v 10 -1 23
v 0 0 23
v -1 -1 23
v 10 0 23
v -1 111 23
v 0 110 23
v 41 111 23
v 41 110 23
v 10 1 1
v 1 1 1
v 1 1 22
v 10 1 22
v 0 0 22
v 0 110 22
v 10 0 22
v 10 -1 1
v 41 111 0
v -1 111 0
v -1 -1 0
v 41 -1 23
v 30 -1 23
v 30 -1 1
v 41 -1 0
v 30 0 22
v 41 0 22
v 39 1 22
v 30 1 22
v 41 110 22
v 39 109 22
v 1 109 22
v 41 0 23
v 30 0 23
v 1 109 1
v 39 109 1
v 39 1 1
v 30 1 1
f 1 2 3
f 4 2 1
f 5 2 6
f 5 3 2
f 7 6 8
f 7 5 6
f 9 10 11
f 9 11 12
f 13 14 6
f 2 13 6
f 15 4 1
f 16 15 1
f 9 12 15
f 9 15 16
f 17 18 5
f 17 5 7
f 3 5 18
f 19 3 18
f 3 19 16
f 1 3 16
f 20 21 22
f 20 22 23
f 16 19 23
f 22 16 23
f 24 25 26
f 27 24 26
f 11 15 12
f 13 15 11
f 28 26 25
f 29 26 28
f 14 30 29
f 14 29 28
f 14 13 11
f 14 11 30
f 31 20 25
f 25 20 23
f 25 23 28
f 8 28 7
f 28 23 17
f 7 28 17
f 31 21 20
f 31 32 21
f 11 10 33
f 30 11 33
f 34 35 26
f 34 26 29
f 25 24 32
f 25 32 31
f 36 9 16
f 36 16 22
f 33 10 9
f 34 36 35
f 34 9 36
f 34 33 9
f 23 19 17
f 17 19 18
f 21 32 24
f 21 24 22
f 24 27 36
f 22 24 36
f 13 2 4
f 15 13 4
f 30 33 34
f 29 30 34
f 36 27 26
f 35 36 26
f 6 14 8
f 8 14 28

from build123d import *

# Parameters (mm, degrees)
SKETCH_1_W          = 40
SKETCH_1_H          = 110
EXTRUDE_1_DEPTH     = 22
SHELL_1_T           = -1
SKETCH_17_W         = 20
SKETCH_17_H         = 21
CUT_EXTRUDE_3_DEPTH = 2
SKETCH_2_W          = 23
SKETCH_2_H          = 110
EXTRUDE_2_DEPTH     = 1
SKETCH_3_W          = 41
SKETCH_3_H          = 23
EXTRUDE_3_DEPTH     = 1
SKETCH_18_W         = 20
SKETCH_18_H         = 22
CUT_EXTRUDE_4_DEPTH = 2
SKETCH_5_W          = 41
SKETCH_5_H          = 23
EXTRUDE_4_DEPTH     = 1
SKETCH_9_W          = 22
SKETCH_9_H          = 112
EXTRUDE_5_DEPTH     = 1
SKETCH_10_W         = 1
SKETCH_10_H         = 1
EXTRUDE_6_DEPTH     = 1
SKETCH_11_W         = 1
SKETCH_11_H         = 1
EXTRUDE_7_DEPTH     = 1


with BuildPart() as part:
    # 스케치1 → 보스-돌출1 (new body)
    with BuildSketch(Plane.XY):
        with Locations((20, 55)):
            Rectangle(SKETCH_1_W, SKETCH_1_H)
    extrude(amount=EXTRUDE_1_DEPTH)

    # 쉘1
    shell_1_openings = [part.faces().sort_by_distance(p)[0] for p in [
        (20, 55, 22),
    ]]
    offset(amount=SHELL_1_T, openings=shell_1_openings, kind=Kind.INTERSECTION)

    # 스케치17 → 컷-돌출3 (cut, through all)
    with BuildSketch(Plane(origin=(0, 1, 0), x_dir=(1, 0, 0), z_dir=(0, 1, 0))):
        with Locations((20, -11.5)):
            Rectangle(SKETCH_17_W, SKETCH_17_H)
    extrude(amount=-CUT_EXTRUDE_3_DEPTH, mode=Mode.SUBTRACT)

    # 스케치2 → 보스-돌출2 (add)
    with BuildSketch(Plane.ZY):
        with Locations((11.5, 55)):
            Rectangle(SKETCH_2_W, SKETCH_2_H)
    extrude(amount=EXTRUDE_2_DEPTH)

    # 스케치3 → 보스-돌출3 (add)
    with BuildSketch(Plane.XZ):
        with Locations((19.5, 11.5)):
            Rectangle(SKETCH_3_W, SKETCH_3_H)
    extrude(amount=EXTRUDE_3_DEPTH)

    # 스케치18 → 컷-돌출4 (cut, through all)
    with BuildSketch(Plane(origin=(0, 0, 0), x_dir=(1, 0, 0), z_dir=(0, 1, 0))):
        with Locations((20, -12)):
            Rectangle(SKETCH_18_W, SKETCH_18_H)
    extrude(amount=-CUT_EXTRUDE_4_DEPTH, mode=Mode.SUBTRACT)

    # 스케치5 → 보스-돌출4 (add)
    with BuildSketch(Plane(origin=(0, 110, 0), x_dir=(1, 0, 0), z_dir=(0, 1, 0))):
        with Locations((19.5, -11.5)):
            Rectangle(SKETCH_5_W, SKETCH_5_H)
    extrude(amount=EXTRUDE_4_DEPTH)

    # 스케치9 → 보스-돌출5 (add)
    with BuildSketch(Plane(origin=(40, 0, 0), x_dir=(0, 0, -1), z_dir=(1, 0, 0))):
        with Locations((-11, 55)):
            Rectangle(SKETCH_9_W, SKETCH_9_H)
    extrude(amount=EXTRUDE_5_DEPTH)

    # 스케치10 → 보스-돌출6 (add)
    with BuildSketch(Plane.XY.offset(22)):
        with Locations((40.5, 110.5)):
            Rectangle(SKETCH_10_W, SKETCH_10_H)
    extrude(amount=EXTRUDE_6_DEPTH)

    # 스케치11 → 보스-돌출7 (add)
    with BuildSketch(Plane.XY.offset(22)):
        with Locations((40.5, -0.5)):
            Rectangle(SKETCH_11_W, SKETCH_11_H)
    extrude(amount=EXTRUDE_7_DEPTH)


solid = part.part
